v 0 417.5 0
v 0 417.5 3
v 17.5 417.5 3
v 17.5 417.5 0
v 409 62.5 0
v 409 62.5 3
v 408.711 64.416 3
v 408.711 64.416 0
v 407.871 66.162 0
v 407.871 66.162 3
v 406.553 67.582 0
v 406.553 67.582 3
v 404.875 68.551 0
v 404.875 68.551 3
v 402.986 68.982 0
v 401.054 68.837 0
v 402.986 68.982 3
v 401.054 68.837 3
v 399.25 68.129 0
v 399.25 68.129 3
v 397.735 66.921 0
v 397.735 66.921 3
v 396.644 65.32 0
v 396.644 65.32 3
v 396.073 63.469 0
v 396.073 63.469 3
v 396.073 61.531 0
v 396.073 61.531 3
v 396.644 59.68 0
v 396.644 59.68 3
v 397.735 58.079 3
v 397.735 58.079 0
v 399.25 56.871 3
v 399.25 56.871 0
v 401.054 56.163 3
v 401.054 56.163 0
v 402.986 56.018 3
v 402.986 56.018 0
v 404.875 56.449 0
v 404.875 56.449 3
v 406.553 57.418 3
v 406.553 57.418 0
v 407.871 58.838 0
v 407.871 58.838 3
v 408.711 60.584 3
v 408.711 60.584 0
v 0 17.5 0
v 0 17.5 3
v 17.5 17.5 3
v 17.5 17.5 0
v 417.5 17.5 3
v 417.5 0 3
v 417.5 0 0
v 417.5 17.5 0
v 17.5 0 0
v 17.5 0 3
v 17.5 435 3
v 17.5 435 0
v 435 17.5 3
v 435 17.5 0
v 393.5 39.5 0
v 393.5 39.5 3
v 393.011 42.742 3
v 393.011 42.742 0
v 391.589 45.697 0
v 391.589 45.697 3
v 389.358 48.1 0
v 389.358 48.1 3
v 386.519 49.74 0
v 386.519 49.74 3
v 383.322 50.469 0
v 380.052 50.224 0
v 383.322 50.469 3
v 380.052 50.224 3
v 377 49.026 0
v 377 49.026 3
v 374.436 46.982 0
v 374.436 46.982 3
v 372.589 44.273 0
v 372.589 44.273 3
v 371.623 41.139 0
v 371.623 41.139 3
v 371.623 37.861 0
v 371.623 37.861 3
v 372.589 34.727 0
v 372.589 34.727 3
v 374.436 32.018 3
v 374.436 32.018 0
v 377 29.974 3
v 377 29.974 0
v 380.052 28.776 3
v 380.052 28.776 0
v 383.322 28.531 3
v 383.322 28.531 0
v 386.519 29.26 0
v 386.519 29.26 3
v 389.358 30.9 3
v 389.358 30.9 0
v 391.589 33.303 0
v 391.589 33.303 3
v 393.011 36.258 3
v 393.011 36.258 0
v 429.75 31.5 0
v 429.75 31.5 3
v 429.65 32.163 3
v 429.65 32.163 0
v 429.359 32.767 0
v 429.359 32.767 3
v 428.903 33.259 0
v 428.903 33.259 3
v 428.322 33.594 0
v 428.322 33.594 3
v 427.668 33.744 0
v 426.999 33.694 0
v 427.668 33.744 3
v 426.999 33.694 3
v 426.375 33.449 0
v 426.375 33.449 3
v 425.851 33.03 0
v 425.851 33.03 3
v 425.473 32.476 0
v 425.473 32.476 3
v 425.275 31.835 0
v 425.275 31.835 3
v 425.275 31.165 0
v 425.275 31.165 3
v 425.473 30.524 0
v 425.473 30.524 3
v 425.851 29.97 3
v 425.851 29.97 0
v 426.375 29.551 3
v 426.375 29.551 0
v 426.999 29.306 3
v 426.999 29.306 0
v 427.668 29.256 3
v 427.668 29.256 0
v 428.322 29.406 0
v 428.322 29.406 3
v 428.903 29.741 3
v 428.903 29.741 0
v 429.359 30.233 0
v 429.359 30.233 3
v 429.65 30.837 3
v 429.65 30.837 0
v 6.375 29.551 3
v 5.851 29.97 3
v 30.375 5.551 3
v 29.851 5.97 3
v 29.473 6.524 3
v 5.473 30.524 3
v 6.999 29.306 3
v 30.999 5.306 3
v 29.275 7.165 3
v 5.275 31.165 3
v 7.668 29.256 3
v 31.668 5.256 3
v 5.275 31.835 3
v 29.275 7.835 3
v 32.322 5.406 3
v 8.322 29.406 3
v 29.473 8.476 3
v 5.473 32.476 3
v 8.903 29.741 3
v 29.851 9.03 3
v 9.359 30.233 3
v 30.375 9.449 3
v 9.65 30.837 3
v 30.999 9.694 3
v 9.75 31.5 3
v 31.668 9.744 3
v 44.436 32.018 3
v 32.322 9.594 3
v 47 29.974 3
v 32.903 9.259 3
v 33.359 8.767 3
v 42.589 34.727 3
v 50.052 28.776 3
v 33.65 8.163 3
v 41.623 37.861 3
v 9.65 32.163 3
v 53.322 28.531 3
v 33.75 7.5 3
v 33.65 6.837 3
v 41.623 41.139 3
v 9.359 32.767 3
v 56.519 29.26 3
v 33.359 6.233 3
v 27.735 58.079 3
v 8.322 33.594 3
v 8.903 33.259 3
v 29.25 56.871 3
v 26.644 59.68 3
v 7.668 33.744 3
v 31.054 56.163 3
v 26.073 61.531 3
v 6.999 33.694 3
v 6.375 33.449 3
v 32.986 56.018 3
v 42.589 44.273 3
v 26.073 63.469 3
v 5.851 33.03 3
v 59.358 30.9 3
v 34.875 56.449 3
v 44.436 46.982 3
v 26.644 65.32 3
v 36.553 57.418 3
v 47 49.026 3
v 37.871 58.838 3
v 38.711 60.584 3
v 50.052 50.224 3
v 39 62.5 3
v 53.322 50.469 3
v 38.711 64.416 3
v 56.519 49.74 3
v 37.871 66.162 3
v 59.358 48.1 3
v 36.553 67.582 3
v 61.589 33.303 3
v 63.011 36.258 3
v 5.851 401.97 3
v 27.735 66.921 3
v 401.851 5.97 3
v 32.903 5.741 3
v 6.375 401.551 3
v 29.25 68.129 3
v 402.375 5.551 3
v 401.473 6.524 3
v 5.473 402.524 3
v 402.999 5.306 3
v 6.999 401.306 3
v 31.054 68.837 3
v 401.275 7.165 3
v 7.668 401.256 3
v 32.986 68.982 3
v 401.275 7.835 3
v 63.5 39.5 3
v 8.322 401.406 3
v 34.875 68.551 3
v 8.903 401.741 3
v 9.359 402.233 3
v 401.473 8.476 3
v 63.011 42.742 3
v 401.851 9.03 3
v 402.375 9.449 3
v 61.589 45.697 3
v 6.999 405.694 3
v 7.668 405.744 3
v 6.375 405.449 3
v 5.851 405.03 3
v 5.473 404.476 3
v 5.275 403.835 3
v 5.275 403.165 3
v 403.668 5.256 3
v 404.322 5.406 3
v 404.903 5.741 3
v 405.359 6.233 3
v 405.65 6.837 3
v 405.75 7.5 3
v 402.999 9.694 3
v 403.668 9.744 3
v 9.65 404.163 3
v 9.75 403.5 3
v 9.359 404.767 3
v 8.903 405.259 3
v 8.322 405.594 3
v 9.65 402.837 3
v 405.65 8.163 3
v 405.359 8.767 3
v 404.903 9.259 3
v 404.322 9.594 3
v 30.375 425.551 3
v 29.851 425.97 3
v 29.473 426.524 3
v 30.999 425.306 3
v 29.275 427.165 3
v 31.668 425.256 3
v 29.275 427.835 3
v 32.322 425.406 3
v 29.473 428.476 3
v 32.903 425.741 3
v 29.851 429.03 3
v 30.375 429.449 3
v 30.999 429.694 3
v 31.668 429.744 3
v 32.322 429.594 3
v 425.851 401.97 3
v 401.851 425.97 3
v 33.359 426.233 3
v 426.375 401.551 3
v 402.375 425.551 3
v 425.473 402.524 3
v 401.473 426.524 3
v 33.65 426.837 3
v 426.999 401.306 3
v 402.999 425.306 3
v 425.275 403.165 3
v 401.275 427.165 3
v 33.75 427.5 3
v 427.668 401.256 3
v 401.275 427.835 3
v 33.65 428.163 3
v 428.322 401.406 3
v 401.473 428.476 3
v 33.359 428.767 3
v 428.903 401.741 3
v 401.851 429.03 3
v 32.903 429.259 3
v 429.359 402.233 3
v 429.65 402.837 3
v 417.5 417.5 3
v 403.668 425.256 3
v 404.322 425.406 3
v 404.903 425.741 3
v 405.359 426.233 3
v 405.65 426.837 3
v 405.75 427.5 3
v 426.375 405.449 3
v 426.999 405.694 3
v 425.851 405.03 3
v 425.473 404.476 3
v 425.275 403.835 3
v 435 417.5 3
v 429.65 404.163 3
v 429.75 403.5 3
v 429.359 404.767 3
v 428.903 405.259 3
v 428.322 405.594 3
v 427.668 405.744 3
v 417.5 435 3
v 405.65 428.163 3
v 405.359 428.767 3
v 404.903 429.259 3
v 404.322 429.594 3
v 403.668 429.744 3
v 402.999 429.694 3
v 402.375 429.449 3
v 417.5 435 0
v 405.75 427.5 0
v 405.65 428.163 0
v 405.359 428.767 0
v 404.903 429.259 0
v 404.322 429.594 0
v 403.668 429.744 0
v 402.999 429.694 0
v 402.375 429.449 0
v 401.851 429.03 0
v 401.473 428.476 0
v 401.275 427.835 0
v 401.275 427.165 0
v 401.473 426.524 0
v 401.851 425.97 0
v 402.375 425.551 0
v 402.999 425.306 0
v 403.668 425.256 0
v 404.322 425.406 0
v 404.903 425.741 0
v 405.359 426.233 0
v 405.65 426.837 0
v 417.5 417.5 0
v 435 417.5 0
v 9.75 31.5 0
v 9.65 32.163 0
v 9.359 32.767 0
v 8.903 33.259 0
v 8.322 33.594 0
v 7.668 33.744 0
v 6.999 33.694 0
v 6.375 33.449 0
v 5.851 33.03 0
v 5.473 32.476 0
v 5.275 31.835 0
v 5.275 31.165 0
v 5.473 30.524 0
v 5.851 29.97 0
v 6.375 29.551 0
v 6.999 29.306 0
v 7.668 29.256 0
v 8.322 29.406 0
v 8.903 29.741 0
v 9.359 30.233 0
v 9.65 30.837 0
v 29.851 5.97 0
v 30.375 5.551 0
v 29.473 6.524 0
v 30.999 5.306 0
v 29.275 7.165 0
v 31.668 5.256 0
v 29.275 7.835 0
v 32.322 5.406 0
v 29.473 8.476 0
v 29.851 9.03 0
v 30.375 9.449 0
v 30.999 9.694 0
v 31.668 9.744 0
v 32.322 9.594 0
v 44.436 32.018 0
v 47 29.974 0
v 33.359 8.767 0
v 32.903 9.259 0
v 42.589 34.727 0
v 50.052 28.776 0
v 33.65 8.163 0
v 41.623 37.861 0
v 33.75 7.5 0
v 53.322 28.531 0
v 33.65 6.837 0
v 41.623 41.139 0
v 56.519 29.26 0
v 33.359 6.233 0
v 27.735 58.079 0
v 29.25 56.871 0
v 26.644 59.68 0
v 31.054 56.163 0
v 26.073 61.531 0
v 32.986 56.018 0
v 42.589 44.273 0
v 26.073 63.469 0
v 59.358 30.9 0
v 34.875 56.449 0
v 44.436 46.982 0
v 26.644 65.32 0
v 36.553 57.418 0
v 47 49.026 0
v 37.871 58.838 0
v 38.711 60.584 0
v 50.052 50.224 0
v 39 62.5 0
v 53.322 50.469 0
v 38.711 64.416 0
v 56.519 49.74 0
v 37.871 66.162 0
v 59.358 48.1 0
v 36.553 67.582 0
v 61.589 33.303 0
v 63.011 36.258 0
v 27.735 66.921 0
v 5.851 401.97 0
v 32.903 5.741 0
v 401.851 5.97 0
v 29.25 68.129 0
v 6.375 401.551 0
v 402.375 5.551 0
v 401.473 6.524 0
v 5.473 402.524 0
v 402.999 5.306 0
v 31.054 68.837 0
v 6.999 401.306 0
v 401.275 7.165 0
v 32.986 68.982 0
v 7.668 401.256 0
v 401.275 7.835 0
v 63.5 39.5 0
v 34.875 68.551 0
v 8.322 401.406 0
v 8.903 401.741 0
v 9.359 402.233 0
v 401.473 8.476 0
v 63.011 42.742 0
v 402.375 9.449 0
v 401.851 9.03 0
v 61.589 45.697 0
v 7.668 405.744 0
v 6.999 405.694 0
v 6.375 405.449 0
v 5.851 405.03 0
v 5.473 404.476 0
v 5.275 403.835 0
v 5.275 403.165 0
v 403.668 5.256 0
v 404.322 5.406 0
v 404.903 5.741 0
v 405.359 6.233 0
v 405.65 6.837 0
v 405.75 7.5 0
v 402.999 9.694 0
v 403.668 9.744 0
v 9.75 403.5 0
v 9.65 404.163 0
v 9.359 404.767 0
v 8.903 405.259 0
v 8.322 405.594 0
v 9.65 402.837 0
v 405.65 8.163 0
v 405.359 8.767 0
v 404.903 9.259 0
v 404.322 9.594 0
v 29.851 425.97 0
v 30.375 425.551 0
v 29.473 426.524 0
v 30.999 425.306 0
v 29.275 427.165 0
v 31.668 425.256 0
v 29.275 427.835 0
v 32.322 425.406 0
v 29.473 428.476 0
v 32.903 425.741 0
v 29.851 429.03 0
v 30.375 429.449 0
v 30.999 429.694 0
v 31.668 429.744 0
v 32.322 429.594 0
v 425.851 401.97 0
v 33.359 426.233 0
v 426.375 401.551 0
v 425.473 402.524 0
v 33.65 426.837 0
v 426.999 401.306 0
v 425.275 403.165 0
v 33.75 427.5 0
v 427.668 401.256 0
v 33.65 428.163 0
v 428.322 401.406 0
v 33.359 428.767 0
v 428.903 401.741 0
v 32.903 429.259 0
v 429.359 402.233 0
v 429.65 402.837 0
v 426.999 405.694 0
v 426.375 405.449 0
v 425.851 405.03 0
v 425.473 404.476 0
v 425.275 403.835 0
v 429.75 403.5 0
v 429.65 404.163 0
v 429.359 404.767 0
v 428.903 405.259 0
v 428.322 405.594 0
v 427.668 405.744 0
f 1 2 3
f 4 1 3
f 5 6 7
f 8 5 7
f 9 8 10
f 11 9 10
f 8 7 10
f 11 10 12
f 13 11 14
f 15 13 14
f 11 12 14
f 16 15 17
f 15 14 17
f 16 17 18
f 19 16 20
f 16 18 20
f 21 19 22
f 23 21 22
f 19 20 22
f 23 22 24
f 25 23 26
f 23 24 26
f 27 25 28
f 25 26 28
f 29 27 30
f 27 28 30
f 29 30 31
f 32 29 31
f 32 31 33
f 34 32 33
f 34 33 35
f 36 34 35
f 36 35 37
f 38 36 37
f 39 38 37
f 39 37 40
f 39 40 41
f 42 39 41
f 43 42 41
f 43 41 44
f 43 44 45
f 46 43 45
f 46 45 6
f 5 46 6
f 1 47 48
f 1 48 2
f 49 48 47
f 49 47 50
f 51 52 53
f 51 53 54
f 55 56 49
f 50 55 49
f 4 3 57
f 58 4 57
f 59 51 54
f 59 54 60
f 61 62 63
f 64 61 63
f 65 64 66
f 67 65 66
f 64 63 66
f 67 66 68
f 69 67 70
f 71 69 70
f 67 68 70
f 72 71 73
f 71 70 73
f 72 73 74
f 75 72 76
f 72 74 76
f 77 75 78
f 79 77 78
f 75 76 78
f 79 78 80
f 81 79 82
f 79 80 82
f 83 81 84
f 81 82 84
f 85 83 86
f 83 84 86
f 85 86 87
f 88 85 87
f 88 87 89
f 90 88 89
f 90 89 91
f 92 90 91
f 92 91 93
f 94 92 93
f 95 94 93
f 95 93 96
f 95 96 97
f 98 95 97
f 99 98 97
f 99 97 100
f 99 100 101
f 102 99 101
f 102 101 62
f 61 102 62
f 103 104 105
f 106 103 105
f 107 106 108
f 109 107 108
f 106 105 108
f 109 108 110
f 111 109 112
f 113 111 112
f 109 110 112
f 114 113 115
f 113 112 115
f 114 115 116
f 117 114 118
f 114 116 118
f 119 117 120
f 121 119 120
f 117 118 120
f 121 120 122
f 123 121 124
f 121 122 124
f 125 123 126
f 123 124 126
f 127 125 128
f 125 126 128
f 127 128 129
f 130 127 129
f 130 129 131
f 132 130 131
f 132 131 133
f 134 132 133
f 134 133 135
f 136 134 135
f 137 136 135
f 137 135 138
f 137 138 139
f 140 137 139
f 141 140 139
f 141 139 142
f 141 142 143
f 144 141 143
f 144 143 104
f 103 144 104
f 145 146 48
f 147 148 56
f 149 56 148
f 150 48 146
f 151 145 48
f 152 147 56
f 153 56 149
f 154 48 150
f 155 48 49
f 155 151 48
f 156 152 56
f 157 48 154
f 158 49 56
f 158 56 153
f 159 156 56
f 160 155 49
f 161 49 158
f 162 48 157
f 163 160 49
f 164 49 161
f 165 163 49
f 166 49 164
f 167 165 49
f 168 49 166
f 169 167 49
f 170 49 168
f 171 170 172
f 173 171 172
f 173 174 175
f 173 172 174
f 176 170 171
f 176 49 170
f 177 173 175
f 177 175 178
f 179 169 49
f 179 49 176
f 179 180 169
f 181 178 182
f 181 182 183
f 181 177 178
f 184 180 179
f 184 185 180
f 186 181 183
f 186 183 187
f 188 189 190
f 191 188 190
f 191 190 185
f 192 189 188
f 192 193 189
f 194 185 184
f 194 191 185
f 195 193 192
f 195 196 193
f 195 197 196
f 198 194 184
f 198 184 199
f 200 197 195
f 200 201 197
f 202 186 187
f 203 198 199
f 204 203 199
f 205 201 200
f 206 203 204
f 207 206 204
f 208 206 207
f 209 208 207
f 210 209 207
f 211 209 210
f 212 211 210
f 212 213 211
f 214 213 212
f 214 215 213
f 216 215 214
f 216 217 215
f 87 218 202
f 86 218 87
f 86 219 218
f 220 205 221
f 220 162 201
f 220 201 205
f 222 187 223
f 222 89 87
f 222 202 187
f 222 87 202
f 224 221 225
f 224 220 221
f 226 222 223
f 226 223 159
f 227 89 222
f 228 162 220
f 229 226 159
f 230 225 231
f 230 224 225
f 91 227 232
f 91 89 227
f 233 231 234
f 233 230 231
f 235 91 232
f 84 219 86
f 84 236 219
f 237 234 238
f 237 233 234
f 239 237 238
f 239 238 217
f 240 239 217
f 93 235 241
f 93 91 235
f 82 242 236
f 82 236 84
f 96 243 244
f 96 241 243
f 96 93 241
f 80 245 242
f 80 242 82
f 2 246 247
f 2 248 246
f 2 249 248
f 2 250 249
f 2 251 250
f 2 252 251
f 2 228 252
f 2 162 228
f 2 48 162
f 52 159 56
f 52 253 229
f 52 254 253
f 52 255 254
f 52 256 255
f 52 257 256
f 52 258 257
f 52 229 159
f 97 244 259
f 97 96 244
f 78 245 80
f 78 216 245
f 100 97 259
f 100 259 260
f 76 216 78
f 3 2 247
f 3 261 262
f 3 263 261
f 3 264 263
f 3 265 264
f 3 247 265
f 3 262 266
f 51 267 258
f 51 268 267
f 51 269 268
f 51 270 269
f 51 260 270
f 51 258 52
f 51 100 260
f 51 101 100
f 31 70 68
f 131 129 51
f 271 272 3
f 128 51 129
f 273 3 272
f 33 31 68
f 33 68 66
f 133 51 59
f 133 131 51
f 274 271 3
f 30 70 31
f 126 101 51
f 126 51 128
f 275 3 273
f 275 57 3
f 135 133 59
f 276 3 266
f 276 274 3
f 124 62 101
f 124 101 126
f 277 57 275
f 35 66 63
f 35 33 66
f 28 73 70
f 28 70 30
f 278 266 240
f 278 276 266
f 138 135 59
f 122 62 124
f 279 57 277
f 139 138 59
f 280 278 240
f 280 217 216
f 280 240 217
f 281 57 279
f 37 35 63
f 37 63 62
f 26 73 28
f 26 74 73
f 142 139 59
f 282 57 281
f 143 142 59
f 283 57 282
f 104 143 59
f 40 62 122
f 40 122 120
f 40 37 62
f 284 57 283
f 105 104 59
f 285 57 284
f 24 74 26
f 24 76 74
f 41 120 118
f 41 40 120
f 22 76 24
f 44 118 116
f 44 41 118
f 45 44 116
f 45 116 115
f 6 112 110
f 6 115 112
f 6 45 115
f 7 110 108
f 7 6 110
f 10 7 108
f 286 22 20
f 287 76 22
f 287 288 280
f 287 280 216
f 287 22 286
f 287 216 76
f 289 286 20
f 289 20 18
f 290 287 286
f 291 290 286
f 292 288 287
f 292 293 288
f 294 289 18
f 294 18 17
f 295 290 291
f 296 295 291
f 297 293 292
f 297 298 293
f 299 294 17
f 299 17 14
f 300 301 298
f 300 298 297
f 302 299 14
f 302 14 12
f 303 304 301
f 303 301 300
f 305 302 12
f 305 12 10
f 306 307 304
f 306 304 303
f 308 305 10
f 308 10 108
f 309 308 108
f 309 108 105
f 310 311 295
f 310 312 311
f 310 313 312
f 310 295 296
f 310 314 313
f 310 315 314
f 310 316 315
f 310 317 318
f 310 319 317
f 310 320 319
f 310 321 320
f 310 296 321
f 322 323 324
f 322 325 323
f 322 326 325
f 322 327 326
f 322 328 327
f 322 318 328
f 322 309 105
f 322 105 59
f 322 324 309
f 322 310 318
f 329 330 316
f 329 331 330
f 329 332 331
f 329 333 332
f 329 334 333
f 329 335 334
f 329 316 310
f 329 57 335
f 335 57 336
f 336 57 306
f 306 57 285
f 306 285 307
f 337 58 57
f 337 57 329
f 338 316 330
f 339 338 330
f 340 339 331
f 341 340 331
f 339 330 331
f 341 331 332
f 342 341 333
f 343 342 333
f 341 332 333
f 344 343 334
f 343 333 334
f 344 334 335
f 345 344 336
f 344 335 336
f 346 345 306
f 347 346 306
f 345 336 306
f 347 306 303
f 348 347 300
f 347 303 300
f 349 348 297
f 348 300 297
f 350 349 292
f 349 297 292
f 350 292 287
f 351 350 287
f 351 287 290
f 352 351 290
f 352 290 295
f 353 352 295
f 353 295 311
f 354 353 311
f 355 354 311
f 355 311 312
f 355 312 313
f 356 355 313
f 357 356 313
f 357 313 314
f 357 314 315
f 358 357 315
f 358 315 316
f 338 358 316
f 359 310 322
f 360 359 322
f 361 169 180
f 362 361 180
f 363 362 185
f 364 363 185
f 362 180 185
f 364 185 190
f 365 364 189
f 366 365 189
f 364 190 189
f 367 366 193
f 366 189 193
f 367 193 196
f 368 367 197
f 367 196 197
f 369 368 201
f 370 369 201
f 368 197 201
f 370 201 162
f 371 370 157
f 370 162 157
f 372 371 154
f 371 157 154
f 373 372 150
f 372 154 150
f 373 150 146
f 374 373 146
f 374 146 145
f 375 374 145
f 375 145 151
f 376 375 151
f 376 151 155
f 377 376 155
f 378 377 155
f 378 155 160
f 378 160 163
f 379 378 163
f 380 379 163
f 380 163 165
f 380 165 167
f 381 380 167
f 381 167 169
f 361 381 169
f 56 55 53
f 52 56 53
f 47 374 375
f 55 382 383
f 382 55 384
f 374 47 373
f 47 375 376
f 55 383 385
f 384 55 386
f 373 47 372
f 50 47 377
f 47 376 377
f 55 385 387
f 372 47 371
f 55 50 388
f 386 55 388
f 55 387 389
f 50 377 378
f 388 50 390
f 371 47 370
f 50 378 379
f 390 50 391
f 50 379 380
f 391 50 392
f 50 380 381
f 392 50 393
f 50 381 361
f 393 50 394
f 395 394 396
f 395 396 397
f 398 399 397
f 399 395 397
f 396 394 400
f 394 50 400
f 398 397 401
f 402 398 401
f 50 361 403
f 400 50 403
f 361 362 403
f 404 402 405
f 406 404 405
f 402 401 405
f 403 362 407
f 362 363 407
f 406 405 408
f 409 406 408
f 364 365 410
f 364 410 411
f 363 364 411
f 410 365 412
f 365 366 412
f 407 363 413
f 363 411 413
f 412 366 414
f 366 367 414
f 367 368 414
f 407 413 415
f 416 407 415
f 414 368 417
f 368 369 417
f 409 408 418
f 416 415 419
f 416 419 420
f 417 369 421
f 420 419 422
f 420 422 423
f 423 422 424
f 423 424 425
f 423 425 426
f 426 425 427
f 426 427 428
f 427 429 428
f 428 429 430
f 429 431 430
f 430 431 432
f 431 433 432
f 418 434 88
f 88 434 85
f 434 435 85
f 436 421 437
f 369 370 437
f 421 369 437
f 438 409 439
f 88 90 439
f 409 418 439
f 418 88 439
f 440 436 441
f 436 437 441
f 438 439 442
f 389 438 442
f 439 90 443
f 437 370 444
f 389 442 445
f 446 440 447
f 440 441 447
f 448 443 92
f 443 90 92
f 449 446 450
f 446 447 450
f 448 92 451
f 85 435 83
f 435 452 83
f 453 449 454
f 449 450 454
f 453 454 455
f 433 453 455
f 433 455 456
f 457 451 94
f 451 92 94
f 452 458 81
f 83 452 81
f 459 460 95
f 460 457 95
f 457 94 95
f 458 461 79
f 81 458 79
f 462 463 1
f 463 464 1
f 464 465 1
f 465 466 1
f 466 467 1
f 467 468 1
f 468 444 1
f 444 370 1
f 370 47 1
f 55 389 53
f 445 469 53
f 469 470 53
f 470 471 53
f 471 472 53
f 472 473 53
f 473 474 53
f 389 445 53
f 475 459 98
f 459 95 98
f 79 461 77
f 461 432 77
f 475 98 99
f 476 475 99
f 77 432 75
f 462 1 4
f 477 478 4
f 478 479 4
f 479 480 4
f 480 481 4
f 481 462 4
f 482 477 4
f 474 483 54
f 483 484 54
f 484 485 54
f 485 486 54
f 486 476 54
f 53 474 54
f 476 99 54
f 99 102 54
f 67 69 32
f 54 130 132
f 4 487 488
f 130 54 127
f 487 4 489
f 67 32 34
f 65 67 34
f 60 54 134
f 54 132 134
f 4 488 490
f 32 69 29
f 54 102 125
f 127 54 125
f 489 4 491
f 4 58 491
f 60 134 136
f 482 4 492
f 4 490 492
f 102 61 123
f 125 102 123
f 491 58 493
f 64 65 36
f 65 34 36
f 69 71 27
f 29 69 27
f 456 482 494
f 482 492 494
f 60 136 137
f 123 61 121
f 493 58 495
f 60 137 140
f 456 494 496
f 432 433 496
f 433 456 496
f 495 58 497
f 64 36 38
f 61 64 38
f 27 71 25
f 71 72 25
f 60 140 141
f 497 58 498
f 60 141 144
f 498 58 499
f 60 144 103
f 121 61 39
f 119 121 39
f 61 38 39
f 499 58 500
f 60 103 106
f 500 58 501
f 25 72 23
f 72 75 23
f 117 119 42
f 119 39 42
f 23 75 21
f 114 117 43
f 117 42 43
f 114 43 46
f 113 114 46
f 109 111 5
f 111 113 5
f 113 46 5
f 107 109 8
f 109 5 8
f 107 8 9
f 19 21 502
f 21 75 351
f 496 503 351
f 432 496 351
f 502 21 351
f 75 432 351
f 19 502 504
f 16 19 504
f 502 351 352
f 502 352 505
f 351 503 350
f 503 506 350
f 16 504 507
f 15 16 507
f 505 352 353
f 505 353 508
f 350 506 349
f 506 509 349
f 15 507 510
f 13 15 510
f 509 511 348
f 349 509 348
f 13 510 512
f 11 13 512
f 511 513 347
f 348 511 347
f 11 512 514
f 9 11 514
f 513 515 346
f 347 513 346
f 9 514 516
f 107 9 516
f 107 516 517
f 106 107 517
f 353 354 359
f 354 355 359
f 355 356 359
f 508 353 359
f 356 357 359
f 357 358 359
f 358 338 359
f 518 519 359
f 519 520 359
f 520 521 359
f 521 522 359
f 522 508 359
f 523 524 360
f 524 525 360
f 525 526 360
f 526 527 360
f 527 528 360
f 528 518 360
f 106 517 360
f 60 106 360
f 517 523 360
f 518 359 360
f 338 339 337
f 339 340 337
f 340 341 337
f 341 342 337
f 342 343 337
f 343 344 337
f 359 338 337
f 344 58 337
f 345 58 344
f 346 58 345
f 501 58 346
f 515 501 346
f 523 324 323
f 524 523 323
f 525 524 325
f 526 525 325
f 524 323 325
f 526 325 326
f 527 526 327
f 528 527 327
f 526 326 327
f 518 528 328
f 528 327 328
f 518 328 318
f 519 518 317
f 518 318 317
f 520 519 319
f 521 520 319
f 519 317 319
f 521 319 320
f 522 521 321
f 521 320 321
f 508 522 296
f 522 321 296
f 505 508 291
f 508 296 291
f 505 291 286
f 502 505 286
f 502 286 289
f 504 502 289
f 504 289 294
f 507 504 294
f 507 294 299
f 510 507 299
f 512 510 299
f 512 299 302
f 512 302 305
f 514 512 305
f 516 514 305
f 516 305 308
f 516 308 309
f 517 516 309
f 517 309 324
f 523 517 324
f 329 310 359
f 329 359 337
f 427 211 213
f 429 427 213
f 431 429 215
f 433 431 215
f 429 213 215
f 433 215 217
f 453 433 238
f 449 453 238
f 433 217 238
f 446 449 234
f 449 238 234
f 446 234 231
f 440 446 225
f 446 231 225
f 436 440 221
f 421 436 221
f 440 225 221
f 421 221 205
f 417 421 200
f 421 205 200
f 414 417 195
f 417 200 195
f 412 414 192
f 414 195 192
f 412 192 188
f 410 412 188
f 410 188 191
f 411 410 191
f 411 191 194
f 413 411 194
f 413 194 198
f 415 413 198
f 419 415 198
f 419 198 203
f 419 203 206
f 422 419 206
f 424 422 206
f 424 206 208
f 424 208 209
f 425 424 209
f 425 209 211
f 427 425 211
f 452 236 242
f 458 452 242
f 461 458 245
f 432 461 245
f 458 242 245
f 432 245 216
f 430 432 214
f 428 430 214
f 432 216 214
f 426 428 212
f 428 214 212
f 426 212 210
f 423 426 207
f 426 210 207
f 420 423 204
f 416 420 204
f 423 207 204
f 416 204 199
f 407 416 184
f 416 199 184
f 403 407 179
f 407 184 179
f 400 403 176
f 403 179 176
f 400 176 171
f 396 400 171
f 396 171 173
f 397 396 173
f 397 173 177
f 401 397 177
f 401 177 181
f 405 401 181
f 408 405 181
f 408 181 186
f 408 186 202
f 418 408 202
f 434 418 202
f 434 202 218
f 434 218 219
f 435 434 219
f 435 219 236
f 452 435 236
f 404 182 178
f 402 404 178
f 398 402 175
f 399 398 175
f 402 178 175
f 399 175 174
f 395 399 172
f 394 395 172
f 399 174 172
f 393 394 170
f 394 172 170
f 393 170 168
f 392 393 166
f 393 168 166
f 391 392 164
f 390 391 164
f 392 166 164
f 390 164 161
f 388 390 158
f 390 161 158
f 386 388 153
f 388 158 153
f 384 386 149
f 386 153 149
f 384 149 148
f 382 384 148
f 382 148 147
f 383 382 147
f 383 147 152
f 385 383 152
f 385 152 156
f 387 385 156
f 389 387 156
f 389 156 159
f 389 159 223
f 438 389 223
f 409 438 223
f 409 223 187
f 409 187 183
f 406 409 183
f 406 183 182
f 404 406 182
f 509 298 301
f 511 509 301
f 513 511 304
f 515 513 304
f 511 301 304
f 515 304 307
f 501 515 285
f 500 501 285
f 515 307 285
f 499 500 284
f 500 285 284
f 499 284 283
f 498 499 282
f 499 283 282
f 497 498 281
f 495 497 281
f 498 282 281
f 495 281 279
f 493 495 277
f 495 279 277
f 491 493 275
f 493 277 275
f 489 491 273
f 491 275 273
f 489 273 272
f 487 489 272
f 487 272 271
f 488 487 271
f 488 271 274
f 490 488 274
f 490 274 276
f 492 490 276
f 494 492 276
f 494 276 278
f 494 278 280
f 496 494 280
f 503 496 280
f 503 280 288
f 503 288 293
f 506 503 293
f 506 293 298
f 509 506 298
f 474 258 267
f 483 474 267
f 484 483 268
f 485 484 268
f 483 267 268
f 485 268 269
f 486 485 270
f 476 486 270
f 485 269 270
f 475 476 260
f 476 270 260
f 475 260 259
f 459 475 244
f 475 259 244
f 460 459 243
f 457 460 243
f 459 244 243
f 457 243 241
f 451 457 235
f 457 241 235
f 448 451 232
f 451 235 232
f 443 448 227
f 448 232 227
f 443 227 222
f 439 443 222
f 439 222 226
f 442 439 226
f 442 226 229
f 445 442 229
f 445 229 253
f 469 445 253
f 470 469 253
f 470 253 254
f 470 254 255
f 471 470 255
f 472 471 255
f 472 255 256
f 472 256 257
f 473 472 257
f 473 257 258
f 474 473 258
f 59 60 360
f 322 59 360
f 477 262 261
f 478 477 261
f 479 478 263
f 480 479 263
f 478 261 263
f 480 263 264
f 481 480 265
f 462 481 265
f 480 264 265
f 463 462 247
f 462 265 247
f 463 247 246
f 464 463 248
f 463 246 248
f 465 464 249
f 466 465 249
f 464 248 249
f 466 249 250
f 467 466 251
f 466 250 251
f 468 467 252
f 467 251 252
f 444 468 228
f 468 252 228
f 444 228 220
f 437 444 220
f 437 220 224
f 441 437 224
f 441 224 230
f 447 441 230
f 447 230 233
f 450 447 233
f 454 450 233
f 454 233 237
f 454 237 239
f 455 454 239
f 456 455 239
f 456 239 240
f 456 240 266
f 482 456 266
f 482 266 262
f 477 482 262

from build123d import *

# Parameters (mm, degrees)
SKETCH002_W   = 435
SKETCH002_H   = 435
PAD_DEPTH     = 3
SKETCH001_R   = 2.25
SKETCH001_R_2 = 6.5
SKETCH001_R_3 = 11
SKETCH001_W   = 20
SKETCH001_H   = 20
POCKET_DEPTH  = 5


with BuildPart() as part:
    # Sketch002 → Pad (new body)
    with BuildSketch(Plane.XY):
        with Locations((217.5, 217.5)):
            Rectangle(SKETCH002_W, SKETCH002_H)
    extrude(amount=PAD_DEPTH)

    # Sketch001 → Pocket (cut)
    with BuildSketch(Plane.XY.offset(3)):
        with Locations((7.5, 31.5)):
            Circle(SKETCH001_R)
        with Locations((31.5, 7.5)):
            Circle(SKETCH001_R)
        with Locations((7.5, 403.5)):
            Circle(SKETCH001_R)
        with Locations((31.5, 427.5)):
            Circle(SKETCH001_R)
        with Locations((403.5, 427.5)):
            Circle(SKETCH001_R)
        with Locations((427.5, 403.5)):
            Circle(SKETCH001_R)
        with Locations((403.5, 7.5)):
            Circle(SKETCH001_R)
        with Locations((427.5, 31.5)):
            Circle(SKETCH001_R)
        with Locations((32.5, 62.5)):
            Circle(SKETCH001_R_2)
        with Locations((52.5, 39.5)):
            Circle(SKETCH001_R_3)
        with Locations((402.5, 62.5)):
            Circle(SKETCH001_R_2)
        with Locations((382.5, 39.5)):
            Circle(SKETCH001_R_3)
        with Locations((7.5, 7.5)):
            Rectangle(SKETCH001_W, SKETCH001_H)
        with Locations((427.5, 7.5)):
            Rectangle(SKETCH001_W, SKETCH001_H)
        with Locations((7.5, 427.5)):
            Rectangle(SKETCH001_W, SKETCH001_H)
        with Locations((427.5, 427.5)):
            Rectangle(SKETCH001_W, SKETCH001_H)
    extrude(amount=-POCKET_DEPTH, mode=Mode.SUBTRACT)


solid = part.part
